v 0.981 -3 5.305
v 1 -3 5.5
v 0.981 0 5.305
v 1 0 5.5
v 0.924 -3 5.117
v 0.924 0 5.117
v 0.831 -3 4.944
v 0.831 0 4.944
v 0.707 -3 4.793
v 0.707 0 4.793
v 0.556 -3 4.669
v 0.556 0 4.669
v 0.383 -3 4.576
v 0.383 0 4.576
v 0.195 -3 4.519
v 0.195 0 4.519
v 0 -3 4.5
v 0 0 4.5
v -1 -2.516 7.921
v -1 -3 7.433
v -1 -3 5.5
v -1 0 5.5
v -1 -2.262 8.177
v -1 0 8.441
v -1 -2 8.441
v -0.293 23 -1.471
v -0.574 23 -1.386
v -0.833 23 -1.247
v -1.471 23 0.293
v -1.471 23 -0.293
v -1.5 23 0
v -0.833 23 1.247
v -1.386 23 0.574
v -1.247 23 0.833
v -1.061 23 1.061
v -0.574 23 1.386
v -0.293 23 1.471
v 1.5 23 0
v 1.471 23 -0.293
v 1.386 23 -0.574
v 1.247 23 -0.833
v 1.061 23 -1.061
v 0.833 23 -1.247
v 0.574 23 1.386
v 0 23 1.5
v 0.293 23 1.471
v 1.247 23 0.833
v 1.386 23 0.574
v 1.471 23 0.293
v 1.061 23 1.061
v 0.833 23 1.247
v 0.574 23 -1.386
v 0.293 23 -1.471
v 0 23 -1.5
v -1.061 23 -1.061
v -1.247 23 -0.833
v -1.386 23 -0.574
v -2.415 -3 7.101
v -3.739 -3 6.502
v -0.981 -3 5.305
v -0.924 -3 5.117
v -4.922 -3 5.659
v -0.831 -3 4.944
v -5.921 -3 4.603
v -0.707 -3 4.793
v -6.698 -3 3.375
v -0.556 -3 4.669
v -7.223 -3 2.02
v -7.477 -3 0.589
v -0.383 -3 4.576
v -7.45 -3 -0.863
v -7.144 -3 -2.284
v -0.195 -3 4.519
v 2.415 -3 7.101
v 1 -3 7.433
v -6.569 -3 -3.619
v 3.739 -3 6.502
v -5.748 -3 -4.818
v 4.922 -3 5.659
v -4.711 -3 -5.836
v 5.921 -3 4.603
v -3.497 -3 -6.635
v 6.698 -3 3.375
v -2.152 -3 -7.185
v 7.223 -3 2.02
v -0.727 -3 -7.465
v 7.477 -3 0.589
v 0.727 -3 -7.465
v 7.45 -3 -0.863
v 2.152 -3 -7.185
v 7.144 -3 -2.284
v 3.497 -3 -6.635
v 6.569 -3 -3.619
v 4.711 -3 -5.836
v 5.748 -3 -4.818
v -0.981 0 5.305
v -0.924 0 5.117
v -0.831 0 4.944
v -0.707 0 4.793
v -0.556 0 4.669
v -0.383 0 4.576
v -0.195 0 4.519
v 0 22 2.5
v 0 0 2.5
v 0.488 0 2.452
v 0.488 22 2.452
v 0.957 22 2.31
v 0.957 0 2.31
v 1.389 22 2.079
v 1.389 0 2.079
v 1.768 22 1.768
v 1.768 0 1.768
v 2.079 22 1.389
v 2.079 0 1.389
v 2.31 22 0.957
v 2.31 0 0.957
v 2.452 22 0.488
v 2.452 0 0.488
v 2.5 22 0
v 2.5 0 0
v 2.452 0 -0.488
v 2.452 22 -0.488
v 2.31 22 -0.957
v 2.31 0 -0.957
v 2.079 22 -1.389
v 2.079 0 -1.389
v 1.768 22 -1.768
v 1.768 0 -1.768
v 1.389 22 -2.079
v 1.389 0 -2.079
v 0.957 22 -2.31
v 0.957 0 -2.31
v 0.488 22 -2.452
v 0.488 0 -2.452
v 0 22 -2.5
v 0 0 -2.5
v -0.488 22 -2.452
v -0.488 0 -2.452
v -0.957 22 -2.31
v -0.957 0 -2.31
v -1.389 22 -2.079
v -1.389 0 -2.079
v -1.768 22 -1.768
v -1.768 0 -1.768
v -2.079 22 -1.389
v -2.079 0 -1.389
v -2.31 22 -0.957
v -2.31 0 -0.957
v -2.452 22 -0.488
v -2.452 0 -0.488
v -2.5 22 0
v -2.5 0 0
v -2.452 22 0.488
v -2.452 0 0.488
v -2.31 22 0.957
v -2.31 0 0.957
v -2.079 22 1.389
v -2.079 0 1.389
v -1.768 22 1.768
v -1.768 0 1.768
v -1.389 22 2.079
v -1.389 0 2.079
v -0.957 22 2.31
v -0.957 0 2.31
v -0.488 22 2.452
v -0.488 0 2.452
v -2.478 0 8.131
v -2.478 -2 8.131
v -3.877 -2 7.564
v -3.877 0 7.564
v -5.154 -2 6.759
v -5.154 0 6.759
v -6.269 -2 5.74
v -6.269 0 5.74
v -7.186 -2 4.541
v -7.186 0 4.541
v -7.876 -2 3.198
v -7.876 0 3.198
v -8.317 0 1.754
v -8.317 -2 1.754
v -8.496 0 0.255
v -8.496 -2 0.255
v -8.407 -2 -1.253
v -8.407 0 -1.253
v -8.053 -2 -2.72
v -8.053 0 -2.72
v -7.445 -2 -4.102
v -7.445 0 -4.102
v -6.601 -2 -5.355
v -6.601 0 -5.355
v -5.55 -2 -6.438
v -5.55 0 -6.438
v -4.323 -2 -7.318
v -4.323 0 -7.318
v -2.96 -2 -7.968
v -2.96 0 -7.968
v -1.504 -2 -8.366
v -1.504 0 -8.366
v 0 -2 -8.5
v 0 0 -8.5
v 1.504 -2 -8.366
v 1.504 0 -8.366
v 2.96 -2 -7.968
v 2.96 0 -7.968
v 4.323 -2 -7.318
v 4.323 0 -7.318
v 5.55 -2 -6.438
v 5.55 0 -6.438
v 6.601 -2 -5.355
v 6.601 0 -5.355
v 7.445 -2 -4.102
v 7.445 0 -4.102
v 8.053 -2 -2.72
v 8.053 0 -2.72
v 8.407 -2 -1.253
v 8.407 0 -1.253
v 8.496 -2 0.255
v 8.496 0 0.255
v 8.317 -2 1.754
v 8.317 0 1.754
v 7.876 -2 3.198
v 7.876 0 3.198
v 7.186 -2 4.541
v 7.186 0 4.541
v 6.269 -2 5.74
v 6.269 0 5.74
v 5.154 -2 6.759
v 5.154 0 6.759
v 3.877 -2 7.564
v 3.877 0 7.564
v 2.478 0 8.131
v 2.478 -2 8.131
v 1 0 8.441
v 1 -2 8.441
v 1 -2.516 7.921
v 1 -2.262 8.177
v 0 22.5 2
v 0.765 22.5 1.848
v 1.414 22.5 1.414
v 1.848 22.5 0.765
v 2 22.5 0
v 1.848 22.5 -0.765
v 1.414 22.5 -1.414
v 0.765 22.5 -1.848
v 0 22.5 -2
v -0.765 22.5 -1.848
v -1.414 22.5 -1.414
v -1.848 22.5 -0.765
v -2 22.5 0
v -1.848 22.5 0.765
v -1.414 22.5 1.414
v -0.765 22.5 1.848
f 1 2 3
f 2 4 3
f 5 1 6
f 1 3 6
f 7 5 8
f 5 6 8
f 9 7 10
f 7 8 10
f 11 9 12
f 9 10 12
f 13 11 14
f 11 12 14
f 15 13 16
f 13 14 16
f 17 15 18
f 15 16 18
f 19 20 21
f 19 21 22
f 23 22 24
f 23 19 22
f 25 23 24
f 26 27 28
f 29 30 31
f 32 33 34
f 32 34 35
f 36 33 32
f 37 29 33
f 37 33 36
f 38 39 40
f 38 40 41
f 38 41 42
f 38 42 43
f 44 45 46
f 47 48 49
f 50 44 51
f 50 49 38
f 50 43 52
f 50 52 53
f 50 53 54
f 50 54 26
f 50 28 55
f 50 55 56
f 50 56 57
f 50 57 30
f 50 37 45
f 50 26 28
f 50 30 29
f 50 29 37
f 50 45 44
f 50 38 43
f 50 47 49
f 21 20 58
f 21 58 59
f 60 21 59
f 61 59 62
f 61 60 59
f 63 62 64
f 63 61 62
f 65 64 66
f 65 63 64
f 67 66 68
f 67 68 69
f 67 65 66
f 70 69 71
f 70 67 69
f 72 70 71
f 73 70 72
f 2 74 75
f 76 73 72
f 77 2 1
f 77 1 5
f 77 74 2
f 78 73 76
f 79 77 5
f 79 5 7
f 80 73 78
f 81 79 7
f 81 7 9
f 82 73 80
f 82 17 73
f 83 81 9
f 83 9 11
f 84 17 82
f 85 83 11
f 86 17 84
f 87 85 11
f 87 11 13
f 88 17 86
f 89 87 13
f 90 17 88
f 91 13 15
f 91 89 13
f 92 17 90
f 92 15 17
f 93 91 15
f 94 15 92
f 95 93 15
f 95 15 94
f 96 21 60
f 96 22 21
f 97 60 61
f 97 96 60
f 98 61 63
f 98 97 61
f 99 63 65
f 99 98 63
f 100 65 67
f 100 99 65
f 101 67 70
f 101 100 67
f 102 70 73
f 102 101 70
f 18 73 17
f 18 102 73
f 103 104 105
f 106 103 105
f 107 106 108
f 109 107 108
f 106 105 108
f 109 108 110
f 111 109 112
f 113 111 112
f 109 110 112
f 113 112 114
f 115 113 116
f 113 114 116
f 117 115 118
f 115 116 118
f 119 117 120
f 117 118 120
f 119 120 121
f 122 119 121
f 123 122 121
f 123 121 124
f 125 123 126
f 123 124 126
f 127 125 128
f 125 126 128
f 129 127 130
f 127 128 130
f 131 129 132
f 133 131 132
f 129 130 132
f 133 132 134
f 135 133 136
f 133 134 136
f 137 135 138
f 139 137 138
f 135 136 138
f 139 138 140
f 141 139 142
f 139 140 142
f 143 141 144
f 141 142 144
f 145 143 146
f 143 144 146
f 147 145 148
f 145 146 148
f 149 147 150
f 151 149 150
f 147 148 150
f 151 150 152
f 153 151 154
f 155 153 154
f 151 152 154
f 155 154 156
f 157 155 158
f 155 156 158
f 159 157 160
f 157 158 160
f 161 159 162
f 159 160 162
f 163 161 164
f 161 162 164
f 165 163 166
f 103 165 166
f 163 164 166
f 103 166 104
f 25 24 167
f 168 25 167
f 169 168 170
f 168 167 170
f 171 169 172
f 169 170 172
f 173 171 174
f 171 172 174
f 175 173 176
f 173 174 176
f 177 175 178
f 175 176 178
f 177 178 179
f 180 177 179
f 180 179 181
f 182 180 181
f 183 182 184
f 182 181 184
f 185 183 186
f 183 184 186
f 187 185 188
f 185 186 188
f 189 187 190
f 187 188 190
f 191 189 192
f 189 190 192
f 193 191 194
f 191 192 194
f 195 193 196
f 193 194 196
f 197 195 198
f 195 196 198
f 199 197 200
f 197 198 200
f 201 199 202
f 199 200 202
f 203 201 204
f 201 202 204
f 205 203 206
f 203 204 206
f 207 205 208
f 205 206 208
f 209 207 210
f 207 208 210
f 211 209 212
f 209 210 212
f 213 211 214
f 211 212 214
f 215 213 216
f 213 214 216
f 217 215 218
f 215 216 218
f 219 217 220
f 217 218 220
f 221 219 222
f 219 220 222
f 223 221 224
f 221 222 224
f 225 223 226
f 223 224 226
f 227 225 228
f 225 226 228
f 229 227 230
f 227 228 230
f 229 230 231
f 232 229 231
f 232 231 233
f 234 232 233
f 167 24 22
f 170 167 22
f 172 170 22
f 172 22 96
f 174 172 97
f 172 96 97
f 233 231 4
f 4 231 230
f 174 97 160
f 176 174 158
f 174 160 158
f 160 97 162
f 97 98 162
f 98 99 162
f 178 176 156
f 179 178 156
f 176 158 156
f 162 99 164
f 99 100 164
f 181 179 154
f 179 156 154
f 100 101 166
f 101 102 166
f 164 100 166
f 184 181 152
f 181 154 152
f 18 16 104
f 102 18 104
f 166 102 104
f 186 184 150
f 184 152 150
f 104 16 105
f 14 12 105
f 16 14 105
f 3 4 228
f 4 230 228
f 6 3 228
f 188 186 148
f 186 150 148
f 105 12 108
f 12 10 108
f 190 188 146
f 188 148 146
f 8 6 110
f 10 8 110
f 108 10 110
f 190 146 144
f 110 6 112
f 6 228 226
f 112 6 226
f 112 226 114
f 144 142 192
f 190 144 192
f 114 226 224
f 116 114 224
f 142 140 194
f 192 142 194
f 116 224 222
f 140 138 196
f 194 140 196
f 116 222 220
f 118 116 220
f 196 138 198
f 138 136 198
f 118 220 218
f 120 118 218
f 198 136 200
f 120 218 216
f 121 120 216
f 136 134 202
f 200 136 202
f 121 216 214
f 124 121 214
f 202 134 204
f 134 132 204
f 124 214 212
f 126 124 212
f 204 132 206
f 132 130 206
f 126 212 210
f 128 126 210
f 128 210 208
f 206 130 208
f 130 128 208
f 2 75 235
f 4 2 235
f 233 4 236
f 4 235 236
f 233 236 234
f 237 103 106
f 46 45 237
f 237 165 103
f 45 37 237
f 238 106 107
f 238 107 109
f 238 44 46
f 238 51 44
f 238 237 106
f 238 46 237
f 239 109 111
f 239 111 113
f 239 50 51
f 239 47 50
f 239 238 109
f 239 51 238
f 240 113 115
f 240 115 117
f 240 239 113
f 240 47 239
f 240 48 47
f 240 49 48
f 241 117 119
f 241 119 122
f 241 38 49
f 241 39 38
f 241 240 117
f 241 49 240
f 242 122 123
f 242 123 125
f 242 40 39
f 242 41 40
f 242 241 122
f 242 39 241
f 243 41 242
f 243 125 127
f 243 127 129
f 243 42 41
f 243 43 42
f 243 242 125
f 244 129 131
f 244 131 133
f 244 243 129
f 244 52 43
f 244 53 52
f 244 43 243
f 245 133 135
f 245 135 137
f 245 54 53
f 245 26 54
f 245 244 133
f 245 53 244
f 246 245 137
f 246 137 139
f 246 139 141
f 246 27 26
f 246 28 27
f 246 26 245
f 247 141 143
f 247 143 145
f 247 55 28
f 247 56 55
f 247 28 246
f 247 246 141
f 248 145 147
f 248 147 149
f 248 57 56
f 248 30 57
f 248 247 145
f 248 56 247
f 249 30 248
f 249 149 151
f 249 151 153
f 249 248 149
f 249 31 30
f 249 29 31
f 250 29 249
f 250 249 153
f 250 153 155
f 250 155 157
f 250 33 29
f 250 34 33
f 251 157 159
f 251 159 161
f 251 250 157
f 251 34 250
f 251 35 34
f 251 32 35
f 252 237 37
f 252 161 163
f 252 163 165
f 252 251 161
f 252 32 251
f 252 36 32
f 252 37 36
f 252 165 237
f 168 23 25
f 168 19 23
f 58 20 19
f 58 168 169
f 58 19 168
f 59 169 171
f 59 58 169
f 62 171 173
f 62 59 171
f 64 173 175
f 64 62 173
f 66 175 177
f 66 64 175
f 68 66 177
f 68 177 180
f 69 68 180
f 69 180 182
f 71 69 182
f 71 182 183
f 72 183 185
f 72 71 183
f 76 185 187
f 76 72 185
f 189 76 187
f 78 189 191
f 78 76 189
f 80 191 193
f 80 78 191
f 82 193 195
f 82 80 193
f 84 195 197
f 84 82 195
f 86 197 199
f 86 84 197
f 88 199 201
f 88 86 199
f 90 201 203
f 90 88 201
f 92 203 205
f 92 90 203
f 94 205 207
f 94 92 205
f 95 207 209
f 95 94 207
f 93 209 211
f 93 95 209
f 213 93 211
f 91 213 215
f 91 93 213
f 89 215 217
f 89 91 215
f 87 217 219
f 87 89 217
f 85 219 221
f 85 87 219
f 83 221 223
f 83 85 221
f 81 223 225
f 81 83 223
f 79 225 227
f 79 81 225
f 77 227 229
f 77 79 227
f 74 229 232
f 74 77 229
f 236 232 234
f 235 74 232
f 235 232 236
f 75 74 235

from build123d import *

# Parameters (mm, degrees)
SKETCH1_R           = 2.5
BOSS_EXTRUDE1_DEPTH = 23
CHAMFER1_SIZE       = 1
SKETCH2_R           = 8.5
BOSS_EXTRUDE2_DEPTH = 3
SKETCH3_W           = 2
SKETCH3_H           = 8
CUT_EXTRUDE1_DEPTH  = 3
FILLET1_R           = 1
CHAMFER2_SIZE       = 1


with BuildPart() as part:
    # Sketch1 → Boss-Extrude1 (new body)
    with BuildSketch(Plane(origin=(0, 0, 0), x_dir=(1, 0, 0), z_dir=(0, 1, 0))):
        with Locations(Location((0, 0, 0), (0, 0, 270))):
            Circle(SKETCH1_R)
    extrude(amount=BOSS_EXTRUDE1_DEPTH)

    # Chamfer1
    chamfer1_edges = [part.edges().sort_by_distance(p)[0] for p in [
        (0, 23, -2.5),
    ]]
    chamfer(chamfer1_edges, length=CHAMFER1_SIZE)

    # Sketch2 → Boss-Extrude2 (add)
    with BuildSketch(Plane.XZ):
        with Locations(Location((0, 0, 0), (0, 0, 270))):
            Circle(SKETCH2_R)
    extrude(amount=BOSS_EXTRUDE2_DEPTH)

    # Sketch3 → Cut-Extrude1 (cut)
    with BuildSketch(Plane.XZ.offset(3)):
        with Locations((0, 8.5)):
            Rectangle(SKETCH3_W, SKETCH3_H)
    extrude(amount=-CUT_EXTRUDE1_DEPTH, mode=Mode.SUBTRACT)

    # Fillet1
    fillet1_edges = [part.edges().sort_by_distance(p)[0] for p in [
        (-1, -1.5, 4.5),
        (1, -1.5, 4.5),
    ]]
    fillet(fillet1_edges, radius=FILLET1_R - 0.0001)  # a hair under: the kernel refuses the full size

    # Chamfer2
    chamfer2_edges = [part.edges().sort_by_distance(p)[0] for p in [
        (-8.485230045, -3, -0.500870333),
    ]]
    chamfer(chamfer2_edges, length=CHAMFER2_SIZE)


solid = part.part
